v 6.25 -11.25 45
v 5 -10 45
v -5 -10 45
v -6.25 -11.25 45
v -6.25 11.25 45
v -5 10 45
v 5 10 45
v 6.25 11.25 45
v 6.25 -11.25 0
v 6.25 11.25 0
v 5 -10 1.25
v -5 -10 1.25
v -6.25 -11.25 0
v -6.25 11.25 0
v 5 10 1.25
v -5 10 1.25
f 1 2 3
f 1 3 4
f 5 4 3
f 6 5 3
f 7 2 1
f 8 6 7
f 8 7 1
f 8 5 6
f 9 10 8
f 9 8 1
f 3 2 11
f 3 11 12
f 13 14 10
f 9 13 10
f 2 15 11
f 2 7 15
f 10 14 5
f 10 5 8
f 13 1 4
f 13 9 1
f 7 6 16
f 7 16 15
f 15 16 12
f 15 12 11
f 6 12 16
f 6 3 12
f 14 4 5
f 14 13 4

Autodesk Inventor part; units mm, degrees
ref_plane "YZ Plane" through (0, 0, 0) normal (1, 0, 0) x (0, 1, 0)
ref_plane "XZ Plane" through (0, 0, 0) normal (0, 1, 0) x (-1, 0, 0)
ref_plane "XY Plane" through (0, 0, 0) normal (0, 0, 1) x (1, 0, 0)
sketch "Sketch1" plane through (0, 0, 0) normal (0, 0, 1) x (1, 0, 0)
  line L0 (0, 15.75) -> (0, -15.75) construction
  line L1 (-8.75, 0) -> (8.75, 0) construction
  line L2 (-6.25, 11.25) -> (6.25, 11.25)
  line L3 (6.25, 11.25) -> (6.25, -11.25)
  line L4 (6.25, -11.25) -> (-6.25, -11.25)
  line L5 (-6.25, -11.25) -> (-6.25, 11.25)
  point P0 (0, 0)
  dimension "d0" = 22.5
  dimension "d1" = 12.5
extrude "Extrusion1" add sketch "Sketch1" along normal blind 45
sketch "Sketch2" plane through (0, 0, 45) normal (0, 0, 1) x (1, 0, 0)
  line L0 (-6.25, 11.25) -> (6.25, 11.25) projected
  line L1 (-6.25, -11.25) -> (-6.25, 11.25) projected
  line L2 (-5, 10) -> (5, 10)
  line L3 (5, 10) -> (5, -10)
  line L4 (5, -10) -> (-5, -10)
  line L5 (-5, -10) -> (-5, 10)
  point P0 (0, 0)
  dimension "d4" = 10
  dimension "d5" = 20
  dimension "d6" = 1.25
  dimension "d7" = 1.25
extrude "Extrusion2" cut sketch "Sketch2" against normal blind 43.75
properties part number "Küvette_20mm" material "Glass"
